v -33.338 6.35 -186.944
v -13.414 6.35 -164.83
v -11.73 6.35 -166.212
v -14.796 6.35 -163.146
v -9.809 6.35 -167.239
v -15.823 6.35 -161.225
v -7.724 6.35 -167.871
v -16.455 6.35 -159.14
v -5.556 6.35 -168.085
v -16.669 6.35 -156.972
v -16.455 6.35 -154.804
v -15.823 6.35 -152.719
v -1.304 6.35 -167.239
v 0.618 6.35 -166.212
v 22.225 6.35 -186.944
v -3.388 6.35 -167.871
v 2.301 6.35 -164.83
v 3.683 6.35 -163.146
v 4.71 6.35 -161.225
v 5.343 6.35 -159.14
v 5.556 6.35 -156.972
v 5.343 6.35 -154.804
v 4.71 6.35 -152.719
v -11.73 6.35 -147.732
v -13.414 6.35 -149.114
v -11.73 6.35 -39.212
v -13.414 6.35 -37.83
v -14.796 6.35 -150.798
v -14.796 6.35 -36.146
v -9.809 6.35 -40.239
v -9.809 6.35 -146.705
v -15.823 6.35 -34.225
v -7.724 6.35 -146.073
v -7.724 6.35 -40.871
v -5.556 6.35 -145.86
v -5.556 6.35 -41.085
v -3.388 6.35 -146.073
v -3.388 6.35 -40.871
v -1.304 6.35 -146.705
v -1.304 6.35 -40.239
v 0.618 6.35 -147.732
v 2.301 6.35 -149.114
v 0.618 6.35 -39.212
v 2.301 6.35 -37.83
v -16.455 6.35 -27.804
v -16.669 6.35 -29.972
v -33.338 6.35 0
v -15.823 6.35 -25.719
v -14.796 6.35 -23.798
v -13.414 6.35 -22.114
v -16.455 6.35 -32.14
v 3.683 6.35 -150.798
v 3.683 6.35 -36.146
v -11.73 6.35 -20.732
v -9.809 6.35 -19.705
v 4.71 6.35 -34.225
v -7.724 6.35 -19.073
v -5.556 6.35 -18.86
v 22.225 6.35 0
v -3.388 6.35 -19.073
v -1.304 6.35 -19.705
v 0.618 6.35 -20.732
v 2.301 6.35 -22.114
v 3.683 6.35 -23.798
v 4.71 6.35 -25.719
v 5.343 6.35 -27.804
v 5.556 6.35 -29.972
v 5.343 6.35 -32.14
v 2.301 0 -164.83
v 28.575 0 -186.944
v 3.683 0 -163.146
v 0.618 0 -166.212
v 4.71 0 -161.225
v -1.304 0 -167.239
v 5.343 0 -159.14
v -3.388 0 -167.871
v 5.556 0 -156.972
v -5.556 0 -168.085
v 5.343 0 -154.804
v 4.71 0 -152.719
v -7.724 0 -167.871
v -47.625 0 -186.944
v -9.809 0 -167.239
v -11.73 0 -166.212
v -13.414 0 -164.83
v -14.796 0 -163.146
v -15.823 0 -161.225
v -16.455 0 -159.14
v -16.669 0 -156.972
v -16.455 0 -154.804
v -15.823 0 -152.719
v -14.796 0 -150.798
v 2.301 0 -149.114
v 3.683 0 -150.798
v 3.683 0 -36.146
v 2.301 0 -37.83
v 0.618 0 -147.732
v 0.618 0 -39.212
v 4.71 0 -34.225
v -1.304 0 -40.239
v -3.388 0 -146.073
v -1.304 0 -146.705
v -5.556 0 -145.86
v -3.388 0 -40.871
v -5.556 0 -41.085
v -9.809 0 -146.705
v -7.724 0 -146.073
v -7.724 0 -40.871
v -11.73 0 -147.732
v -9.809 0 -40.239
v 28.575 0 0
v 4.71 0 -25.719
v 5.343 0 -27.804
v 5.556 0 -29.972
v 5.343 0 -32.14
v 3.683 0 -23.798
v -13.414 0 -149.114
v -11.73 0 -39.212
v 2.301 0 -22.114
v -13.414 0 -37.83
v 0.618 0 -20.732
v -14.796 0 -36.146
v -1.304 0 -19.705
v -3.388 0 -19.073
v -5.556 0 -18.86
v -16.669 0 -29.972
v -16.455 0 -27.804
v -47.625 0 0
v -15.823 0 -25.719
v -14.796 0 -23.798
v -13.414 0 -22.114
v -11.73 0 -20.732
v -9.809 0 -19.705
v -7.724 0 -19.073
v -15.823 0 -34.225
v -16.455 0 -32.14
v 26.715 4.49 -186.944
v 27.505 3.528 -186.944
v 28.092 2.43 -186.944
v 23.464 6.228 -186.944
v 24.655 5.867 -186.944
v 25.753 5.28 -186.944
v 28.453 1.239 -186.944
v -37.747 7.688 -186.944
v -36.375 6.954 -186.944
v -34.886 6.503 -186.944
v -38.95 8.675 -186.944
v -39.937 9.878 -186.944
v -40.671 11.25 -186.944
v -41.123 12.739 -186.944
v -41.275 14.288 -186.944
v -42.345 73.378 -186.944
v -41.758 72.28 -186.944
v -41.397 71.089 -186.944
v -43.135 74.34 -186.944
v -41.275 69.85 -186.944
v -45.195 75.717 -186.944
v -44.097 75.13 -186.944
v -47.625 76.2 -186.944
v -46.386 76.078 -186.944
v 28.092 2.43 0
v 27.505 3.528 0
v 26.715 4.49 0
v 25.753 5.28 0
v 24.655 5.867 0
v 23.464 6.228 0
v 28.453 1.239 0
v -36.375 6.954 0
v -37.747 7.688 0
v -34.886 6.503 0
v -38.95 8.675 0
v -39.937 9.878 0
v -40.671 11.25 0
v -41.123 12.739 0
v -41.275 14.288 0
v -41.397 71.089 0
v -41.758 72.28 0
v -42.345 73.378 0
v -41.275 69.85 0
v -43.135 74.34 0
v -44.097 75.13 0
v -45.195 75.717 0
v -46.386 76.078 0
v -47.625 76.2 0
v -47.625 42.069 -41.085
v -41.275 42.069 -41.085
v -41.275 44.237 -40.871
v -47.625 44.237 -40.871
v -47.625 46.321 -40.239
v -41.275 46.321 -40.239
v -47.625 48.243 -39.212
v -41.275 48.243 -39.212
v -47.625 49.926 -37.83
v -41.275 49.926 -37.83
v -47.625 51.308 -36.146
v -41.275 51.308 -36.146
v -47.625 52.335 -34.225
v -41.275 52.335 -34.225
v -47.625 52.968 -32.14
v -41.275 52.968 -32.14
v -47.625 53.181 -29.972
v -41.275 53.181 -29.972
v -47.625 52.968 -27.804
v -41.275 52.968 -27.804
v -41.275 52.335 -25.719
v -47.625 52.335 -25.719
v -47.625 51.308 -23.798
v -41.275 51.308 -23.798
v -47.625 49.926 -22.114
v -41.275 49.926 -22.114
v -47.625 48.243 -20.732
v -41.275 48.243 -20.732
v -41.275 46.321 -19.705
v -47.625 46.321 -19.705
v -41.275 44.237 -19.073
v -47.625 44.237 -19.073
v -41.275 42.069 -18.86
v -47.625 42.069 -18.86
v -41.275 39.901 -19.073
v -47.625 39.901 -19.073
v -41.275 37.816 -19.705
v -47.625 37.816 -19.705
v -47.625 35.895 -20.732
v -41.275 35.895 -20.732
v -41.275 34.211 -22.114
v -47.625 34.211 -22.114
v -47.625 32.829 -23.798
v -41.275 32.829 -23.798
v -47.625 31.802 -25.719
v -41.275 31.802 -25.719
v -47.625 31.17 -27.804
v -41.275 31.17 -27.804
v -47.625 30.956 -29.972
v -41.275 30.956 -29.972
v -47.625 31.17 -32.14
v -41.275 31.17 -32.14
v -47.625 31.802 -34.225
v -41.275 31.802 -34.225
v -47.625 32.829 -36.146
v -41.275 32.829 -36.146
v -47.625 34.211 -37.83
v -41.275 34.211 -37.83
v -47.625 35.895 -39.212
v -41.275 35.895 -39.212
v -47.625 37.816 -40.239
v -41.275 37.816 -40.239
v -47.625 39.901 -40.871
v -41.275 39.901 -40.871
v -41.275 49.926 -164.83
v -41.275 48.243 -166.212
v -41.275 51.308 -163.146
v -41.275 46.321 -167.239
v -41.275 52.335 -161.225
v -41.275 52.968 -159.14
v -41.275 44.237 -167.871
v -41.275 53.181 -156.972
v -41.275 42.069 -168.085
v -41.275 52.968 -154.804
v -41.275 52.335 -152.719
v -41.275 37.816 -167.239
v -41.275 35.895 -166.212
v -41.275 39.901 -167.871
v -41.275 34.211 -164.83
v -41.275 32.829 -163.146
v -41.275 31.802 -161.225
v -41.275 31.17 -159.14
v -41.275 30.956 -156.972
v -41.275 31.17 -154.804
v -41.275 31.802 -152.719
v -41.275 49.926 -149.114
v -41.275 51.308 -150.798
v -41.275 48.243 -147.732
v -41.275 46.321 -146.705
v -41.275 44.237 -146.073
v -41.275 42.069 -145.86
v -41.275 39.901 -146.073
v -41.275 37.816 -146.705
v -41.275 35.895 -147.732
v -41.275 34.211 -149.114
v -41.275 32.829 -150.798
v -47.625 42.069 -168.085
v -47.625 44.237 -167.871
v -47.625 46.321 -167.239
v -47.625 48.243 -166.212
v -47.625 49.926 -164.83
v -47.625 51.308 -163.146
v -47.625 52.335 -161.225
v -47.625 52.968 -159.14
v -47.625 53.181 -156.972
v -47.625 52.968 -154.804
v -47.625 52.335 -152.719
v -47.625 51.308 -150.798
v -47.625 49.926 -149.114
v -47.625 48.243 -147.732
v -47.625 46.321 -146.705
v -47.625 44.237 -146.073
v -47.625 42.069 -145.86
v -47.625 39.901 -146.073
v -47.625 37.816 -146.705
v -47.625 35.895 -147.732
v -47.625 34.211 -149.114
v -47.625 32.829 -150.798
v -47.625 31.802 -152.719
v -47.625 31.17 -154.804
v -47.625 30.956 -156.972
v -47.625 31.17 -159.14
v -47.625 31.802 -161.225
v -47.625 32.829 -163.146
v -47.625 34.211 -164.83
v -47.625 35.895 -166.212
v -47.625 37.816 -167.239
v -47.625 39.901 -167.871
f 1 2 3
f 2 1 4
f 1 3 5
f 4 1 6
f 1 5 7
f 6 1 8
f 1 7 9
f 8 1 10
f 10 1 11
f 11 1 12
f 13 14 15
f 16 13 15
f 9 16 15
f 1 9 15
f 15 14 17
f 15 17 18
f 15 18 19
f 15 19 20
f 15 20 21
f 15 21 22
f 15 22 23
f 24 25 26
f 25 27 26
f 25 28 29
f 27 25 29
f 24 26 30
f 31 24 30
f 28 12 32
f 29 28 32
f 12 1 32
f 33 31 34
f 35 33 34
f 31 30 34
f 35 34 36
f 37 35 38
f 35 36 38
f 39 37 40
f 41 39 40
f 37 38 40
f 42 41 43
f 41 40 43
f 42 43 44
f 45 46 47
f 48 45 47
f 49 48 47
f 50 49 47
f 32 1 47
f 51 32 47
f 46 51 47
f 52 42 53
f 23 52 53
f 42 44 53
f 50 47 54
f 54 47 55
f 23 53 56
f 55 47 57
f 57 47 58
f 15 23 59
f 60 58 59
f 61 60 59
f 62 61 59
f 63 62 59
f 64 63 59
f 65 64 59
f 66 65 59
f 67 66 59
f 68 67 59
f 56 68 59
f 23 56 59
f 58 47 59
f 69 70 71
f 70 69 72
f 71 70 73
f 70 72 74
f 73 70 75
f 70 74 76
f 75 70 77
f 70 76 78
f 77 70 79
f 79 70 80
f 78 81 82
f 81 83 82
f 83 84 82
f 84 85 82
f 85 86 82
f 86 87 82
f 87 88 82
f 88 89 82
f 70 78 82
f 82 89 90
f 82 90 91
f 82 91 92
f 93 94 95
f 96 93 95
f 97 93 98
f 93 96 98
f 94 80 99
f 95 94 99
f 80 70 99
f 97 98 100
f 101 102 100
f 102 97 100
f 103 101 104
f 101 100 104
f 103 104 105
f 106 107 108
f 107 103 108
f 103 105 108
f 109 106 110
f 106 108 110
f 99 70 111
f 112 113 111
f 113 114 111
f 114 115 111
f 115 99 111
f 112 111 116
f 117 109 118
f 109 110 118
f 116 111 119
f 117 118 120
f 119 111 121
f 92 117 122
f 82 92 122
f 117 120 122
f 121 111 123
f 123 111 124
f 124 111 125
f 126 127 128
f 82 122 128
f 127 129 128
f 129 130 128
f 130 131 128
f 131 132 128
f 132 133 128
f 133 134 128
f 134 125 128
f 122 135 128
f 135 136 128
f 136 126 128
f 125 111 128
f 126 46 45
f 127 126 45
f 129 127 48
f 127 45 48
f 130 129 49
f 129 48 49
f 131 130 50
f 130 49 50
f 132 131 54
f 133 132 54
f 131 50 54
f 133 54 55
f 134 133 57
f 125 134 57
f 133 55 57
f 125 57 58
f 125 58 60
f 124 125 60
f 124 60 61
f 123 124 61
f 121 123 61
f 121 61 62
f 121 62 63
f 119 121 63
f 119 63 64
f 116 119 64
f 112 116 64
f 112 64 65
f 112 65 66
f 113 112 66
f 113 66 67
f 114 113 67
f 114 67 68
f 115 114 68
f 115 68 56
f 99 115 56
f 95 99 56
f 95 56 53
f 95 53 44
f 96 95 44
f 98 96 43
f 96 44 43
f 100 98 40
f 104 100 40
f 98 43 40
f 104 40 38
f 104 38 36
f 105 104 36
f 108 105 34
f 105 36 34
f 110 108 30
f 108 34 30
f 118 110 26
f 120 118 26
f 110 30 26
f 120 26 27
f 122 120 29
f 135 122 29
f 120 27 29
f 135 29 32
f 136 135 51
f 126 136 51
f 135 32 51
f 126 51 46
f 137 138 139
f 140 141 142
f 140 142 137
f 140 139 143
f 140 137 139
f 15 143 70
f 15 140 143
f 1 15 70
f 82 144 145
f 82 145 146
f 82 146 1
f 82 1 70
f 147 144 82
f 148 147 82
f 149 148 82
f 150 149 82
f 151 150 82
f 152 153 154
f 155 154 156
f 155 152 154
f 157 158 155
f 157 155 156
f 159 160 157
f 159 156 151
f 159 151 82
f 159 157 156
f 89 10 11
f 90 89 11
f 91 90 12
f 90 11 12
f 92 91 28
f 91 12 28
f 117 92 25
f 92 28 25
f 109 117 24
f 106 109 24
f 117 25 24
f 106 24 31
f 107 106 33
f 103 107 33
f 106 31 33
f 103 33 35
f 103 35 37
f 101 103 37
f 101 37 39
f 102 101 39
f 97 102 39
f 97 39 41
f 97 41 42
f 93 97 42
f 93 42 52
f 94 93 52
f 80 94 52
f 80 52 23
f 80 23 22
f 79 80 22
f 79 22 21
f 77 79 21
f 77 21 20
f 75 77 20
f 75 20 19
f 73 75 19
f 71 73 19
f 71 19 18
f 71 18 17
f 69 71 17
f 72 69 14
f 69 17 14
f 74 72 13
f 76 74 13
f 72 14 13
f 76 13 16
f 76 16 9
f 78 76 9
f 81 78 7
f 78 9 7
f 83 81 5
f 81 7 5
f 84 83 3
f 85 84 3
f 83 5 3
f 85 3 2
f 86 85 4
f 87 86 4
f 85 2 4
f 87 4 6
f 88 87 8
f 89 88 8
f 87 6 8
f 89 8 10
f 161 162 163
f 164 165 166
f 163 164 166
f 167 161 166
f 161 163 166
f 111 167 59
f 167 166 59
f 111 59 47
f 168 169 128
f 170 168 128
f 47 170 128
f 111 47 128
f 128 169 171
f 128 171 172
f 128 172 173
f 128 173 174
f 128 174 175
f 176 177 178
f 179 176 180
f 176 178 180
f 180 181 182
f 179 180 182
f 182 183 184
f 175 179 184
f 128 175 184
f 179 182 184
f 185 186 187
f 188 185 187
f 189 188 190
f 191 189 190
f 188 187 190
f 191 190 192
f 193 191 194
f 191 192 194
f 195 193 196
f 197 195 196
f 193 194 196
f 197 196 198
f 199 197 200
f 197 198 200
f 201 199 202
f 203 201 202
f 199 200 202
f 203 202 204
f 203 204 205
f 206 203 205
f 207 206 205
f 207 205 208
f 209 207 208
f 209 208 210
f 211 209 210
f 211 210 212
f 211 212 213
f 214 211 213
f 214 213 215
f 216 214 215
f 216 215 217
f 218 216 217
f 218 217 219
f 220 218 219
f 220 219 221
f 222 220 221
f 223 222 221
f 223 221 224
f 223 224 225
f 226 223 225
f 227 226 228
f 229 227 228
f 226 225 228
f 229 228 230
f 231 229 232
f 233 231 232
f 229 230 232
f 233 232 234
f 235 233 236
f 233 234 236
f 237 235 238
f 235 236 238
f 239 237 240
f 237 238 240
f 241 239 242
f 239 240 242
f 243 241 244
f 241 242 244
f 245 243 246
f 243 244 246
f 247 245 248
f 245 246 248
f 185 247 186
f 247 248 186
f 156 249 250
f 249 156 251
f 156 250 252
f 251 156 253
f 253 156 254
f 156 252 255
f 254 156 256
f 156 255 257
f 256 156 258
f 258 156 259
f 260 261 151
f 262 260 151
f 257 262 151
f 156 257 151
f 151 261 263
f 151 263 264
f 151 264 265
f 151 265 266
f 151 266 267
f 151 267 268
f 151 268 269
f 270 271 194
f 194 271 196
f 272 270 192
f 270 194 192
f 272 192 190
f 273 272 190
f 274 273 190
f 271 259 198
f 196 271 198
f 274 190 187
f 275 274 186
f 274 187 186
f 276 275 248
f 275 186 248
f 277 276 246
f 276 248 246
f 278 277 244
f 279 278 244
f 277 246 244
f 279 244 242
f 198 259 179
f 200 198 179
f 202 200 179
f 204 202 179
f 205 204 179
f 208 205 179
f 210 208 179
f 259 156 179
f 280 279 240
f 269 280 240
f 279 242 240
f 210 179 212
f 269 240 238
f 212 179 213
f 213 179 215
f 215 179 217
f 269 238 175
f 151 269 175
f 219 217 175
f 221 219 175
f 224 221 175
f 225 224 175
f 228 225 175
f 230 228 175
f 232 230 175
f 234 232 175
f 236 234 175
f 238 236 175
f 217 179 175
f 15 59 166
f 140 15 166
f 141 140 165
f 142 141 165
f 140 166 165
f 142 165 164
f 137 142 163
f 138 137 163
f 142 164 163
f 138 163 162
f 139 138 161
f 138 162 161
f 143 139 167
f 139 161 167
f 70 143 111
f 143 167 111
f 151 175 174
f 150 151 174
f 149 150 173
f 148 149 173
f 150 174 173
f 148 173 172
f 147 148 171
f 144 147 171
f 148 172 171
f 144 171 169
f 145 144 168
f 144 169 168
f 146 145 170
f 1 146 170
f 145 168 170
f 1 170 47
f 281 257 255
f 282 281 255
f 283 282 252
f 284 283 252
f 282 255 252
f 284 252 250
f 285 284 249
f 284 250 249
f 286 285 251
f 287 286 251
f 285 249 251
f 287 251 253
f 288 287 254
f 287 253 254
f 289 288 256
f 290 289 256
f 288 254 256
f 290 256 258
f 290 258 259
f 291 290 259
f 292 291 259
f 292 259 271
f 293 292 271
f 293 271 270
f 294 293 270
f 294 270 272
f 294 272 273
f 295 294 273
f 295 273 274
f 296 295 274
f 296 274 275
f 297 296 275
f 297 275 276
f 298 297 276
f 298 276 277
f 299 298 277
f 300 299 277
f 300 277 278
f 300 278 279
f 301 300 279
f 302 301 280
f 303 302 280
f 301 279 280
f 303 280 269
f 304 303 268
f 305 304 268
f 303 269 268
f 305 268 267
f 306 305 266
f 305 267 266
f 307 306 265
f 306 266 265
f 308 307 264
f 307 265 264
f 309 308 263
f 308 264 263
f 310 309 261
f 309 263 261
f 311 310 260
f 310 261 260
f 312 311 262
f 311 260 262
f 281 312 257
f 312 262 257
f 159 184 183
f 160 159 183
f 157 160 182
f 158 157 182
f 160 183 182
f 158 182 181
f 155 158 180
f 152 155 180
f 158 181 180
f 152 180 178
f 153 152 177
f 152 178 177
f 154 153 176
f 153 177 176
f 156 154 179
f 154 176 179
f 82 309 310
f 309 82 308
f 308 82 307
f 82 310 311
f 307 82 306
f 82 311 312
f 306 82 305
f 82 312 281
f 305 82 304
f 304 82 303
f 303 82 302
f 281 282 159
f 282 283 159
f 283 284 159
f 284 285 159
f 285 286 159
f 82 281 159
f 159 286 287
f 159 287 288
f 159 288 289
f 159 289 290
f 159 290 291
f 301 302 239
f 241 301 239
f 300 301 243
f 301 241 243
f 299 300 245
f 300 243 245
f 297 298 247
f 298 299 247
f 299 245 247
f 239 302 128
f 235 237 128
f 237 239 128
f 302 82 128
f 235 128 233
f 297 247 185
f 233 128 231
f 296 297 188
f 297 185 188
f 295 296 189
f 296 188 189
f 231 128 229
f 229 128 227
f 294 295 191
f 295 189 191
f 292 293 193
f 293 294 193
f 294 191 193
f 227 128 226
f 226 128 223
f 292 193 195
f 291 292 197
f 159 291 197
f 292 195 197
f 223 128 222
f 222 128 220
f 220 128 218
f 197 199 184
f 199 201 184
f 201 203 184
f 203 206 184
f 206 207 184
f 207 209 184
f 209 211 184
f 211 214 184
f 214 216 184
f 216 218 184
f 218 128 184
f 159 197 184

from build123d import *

# Parameters (mm, degrees)
BOSS_EXTRUDE1_DEPTH = 186.944
CUT_EXTRUDE1_REACH  = 215.62
SKETCH2_R           = 11.1125
CUT_EXTRUDE2_REACH  = 207.171
SKETCH3_R           = 11.1125


with BuildPart() as part:
    # Sketch1 → Boss-Extrude1 (new body)
    with BuildSketch(Plane.XY):
        with BuildLine():
            Line((-47.62501925, 0), (-47.62501925, 76.2))
            ThreePointArc((-47.62501925, 76.2), (-43.134891189, 74.340128061), (-41.27501925, 69.85))
            Line((-41.27501925, 69.85), (-41.27501925, 14.2875))
            ThreePointArc((-41.27501925, 14.2875), (-38.950179326, 8.674839924), (-33.33751925, 6.35))
            Line((-33.33751925, 6.35), (22.22498075, 6.35))
            ThreePointArc((22.22498075, 6.35), (26.715108811, 4.490128061), (28.57498075, 0))
            Line((28.57498075, 0), (-47.62501925, 0))
        make_face()
    extrude(amount=-BOSS_EXTRUDE1_DEPTH)

    # Sketch2 → Cut-Extrude1 (cut, up to next)
    with BuildSketch(Plane(origin=(-41.27501925, 0, 0), x_dir=(0, 0, -1), z_dir=(1, 0, 0)), mode=Mode.PRIVATE) as cut_extrude1_sk1:
        with Locations((156.972, 42.06875)):
            Circle(SKETCH2_R)
    cut_extrude1_tool1 = extrude(cut_extrude1_sk1.sketch, amount=-CUT_EXTRUDE1_REACH, mode=Mode.PRIVATE) & part.part
    # Sketch2 → Cut-Extrude1 (cut, up to next)
    with BuildSketch(Plane(origin=(-41.27501925, 0, 0), x_dir=(0, 0, -1), z_dir=(1, 0, 0)), mode=Mode.PRIVATE) as cut_extrude1_sk2:
        with Locations((29.972, 42.06875)):
            Circle(SKETCH2_R)
    cut_extrude1_tool2 = extrude(cut_extrude1_sk2.sketch, amount=-CUT_EXTRUDE1_REACH, mode=Mode.PRIVATE) & part.part
    add(cut_extrude1_tool1.solids().sort_by_distance((-41.275019, 42.06875, -156.972))[0], mode=Mode.SUBTRACT)
    add(cut_extrude1_tool2.solids().sort_by_distance((-41.275019, 42.06875, -29.972))[0], mode=Mode.SUBTRACT)

    # Sketch3 → Cut-Extrude2 (cut, up to next)
    with BuildSketch(Plane(origin=(0, 6.35, 0), x_dir=(1, 0, 0), z_dir=(0, 1, 0)), mode=Mode.PRIVATE) as cut_extrude2_sk1:
        with Locations(Location((-5.55626925, 156.972, 0), (0, 0, 180))):
            Circle(SKETCH3_R)
    cut_extrude2_tool1 = extrude(cut_extrude2_sk1.sketch, amount=-CUT_EXTRUDE2_REACH, mode=Mode.PRIVATE) & part.part
    # Sketch3 → Cut-Extrude2 (cut, up to next)
    with BuildSketch(Plane(origin=(0, 6.35, 0), x_dir=(1, 0, 0), z_dir=(0, 1, 0)), mode=Mode.PRIVATE) as cut_extrude2_sk2:
        with Locations(Location((-5.55626925, 29.972, 0), (0, 0, 180))):
            Circle(SKETCH3_R)
    cut_extrude2_tool2 = extrude(cut_extrude2_sk2.sketch, amount=-CUT_EXTRUDE2_REACH, mode=Mode.PRIVATE) & part.part
    add(cut_extrude2_tool1.solids().sort_by_distance((-5.556269, 6.35, -156.972))[0], mode=Mode.SUBTRACT)
    add(cut_extrude2_tool2.solids().sort_by_distance((-5.556269, 6.35, -29.972))[0], mode=Mode.SUBTRACT)


solid = part.part
